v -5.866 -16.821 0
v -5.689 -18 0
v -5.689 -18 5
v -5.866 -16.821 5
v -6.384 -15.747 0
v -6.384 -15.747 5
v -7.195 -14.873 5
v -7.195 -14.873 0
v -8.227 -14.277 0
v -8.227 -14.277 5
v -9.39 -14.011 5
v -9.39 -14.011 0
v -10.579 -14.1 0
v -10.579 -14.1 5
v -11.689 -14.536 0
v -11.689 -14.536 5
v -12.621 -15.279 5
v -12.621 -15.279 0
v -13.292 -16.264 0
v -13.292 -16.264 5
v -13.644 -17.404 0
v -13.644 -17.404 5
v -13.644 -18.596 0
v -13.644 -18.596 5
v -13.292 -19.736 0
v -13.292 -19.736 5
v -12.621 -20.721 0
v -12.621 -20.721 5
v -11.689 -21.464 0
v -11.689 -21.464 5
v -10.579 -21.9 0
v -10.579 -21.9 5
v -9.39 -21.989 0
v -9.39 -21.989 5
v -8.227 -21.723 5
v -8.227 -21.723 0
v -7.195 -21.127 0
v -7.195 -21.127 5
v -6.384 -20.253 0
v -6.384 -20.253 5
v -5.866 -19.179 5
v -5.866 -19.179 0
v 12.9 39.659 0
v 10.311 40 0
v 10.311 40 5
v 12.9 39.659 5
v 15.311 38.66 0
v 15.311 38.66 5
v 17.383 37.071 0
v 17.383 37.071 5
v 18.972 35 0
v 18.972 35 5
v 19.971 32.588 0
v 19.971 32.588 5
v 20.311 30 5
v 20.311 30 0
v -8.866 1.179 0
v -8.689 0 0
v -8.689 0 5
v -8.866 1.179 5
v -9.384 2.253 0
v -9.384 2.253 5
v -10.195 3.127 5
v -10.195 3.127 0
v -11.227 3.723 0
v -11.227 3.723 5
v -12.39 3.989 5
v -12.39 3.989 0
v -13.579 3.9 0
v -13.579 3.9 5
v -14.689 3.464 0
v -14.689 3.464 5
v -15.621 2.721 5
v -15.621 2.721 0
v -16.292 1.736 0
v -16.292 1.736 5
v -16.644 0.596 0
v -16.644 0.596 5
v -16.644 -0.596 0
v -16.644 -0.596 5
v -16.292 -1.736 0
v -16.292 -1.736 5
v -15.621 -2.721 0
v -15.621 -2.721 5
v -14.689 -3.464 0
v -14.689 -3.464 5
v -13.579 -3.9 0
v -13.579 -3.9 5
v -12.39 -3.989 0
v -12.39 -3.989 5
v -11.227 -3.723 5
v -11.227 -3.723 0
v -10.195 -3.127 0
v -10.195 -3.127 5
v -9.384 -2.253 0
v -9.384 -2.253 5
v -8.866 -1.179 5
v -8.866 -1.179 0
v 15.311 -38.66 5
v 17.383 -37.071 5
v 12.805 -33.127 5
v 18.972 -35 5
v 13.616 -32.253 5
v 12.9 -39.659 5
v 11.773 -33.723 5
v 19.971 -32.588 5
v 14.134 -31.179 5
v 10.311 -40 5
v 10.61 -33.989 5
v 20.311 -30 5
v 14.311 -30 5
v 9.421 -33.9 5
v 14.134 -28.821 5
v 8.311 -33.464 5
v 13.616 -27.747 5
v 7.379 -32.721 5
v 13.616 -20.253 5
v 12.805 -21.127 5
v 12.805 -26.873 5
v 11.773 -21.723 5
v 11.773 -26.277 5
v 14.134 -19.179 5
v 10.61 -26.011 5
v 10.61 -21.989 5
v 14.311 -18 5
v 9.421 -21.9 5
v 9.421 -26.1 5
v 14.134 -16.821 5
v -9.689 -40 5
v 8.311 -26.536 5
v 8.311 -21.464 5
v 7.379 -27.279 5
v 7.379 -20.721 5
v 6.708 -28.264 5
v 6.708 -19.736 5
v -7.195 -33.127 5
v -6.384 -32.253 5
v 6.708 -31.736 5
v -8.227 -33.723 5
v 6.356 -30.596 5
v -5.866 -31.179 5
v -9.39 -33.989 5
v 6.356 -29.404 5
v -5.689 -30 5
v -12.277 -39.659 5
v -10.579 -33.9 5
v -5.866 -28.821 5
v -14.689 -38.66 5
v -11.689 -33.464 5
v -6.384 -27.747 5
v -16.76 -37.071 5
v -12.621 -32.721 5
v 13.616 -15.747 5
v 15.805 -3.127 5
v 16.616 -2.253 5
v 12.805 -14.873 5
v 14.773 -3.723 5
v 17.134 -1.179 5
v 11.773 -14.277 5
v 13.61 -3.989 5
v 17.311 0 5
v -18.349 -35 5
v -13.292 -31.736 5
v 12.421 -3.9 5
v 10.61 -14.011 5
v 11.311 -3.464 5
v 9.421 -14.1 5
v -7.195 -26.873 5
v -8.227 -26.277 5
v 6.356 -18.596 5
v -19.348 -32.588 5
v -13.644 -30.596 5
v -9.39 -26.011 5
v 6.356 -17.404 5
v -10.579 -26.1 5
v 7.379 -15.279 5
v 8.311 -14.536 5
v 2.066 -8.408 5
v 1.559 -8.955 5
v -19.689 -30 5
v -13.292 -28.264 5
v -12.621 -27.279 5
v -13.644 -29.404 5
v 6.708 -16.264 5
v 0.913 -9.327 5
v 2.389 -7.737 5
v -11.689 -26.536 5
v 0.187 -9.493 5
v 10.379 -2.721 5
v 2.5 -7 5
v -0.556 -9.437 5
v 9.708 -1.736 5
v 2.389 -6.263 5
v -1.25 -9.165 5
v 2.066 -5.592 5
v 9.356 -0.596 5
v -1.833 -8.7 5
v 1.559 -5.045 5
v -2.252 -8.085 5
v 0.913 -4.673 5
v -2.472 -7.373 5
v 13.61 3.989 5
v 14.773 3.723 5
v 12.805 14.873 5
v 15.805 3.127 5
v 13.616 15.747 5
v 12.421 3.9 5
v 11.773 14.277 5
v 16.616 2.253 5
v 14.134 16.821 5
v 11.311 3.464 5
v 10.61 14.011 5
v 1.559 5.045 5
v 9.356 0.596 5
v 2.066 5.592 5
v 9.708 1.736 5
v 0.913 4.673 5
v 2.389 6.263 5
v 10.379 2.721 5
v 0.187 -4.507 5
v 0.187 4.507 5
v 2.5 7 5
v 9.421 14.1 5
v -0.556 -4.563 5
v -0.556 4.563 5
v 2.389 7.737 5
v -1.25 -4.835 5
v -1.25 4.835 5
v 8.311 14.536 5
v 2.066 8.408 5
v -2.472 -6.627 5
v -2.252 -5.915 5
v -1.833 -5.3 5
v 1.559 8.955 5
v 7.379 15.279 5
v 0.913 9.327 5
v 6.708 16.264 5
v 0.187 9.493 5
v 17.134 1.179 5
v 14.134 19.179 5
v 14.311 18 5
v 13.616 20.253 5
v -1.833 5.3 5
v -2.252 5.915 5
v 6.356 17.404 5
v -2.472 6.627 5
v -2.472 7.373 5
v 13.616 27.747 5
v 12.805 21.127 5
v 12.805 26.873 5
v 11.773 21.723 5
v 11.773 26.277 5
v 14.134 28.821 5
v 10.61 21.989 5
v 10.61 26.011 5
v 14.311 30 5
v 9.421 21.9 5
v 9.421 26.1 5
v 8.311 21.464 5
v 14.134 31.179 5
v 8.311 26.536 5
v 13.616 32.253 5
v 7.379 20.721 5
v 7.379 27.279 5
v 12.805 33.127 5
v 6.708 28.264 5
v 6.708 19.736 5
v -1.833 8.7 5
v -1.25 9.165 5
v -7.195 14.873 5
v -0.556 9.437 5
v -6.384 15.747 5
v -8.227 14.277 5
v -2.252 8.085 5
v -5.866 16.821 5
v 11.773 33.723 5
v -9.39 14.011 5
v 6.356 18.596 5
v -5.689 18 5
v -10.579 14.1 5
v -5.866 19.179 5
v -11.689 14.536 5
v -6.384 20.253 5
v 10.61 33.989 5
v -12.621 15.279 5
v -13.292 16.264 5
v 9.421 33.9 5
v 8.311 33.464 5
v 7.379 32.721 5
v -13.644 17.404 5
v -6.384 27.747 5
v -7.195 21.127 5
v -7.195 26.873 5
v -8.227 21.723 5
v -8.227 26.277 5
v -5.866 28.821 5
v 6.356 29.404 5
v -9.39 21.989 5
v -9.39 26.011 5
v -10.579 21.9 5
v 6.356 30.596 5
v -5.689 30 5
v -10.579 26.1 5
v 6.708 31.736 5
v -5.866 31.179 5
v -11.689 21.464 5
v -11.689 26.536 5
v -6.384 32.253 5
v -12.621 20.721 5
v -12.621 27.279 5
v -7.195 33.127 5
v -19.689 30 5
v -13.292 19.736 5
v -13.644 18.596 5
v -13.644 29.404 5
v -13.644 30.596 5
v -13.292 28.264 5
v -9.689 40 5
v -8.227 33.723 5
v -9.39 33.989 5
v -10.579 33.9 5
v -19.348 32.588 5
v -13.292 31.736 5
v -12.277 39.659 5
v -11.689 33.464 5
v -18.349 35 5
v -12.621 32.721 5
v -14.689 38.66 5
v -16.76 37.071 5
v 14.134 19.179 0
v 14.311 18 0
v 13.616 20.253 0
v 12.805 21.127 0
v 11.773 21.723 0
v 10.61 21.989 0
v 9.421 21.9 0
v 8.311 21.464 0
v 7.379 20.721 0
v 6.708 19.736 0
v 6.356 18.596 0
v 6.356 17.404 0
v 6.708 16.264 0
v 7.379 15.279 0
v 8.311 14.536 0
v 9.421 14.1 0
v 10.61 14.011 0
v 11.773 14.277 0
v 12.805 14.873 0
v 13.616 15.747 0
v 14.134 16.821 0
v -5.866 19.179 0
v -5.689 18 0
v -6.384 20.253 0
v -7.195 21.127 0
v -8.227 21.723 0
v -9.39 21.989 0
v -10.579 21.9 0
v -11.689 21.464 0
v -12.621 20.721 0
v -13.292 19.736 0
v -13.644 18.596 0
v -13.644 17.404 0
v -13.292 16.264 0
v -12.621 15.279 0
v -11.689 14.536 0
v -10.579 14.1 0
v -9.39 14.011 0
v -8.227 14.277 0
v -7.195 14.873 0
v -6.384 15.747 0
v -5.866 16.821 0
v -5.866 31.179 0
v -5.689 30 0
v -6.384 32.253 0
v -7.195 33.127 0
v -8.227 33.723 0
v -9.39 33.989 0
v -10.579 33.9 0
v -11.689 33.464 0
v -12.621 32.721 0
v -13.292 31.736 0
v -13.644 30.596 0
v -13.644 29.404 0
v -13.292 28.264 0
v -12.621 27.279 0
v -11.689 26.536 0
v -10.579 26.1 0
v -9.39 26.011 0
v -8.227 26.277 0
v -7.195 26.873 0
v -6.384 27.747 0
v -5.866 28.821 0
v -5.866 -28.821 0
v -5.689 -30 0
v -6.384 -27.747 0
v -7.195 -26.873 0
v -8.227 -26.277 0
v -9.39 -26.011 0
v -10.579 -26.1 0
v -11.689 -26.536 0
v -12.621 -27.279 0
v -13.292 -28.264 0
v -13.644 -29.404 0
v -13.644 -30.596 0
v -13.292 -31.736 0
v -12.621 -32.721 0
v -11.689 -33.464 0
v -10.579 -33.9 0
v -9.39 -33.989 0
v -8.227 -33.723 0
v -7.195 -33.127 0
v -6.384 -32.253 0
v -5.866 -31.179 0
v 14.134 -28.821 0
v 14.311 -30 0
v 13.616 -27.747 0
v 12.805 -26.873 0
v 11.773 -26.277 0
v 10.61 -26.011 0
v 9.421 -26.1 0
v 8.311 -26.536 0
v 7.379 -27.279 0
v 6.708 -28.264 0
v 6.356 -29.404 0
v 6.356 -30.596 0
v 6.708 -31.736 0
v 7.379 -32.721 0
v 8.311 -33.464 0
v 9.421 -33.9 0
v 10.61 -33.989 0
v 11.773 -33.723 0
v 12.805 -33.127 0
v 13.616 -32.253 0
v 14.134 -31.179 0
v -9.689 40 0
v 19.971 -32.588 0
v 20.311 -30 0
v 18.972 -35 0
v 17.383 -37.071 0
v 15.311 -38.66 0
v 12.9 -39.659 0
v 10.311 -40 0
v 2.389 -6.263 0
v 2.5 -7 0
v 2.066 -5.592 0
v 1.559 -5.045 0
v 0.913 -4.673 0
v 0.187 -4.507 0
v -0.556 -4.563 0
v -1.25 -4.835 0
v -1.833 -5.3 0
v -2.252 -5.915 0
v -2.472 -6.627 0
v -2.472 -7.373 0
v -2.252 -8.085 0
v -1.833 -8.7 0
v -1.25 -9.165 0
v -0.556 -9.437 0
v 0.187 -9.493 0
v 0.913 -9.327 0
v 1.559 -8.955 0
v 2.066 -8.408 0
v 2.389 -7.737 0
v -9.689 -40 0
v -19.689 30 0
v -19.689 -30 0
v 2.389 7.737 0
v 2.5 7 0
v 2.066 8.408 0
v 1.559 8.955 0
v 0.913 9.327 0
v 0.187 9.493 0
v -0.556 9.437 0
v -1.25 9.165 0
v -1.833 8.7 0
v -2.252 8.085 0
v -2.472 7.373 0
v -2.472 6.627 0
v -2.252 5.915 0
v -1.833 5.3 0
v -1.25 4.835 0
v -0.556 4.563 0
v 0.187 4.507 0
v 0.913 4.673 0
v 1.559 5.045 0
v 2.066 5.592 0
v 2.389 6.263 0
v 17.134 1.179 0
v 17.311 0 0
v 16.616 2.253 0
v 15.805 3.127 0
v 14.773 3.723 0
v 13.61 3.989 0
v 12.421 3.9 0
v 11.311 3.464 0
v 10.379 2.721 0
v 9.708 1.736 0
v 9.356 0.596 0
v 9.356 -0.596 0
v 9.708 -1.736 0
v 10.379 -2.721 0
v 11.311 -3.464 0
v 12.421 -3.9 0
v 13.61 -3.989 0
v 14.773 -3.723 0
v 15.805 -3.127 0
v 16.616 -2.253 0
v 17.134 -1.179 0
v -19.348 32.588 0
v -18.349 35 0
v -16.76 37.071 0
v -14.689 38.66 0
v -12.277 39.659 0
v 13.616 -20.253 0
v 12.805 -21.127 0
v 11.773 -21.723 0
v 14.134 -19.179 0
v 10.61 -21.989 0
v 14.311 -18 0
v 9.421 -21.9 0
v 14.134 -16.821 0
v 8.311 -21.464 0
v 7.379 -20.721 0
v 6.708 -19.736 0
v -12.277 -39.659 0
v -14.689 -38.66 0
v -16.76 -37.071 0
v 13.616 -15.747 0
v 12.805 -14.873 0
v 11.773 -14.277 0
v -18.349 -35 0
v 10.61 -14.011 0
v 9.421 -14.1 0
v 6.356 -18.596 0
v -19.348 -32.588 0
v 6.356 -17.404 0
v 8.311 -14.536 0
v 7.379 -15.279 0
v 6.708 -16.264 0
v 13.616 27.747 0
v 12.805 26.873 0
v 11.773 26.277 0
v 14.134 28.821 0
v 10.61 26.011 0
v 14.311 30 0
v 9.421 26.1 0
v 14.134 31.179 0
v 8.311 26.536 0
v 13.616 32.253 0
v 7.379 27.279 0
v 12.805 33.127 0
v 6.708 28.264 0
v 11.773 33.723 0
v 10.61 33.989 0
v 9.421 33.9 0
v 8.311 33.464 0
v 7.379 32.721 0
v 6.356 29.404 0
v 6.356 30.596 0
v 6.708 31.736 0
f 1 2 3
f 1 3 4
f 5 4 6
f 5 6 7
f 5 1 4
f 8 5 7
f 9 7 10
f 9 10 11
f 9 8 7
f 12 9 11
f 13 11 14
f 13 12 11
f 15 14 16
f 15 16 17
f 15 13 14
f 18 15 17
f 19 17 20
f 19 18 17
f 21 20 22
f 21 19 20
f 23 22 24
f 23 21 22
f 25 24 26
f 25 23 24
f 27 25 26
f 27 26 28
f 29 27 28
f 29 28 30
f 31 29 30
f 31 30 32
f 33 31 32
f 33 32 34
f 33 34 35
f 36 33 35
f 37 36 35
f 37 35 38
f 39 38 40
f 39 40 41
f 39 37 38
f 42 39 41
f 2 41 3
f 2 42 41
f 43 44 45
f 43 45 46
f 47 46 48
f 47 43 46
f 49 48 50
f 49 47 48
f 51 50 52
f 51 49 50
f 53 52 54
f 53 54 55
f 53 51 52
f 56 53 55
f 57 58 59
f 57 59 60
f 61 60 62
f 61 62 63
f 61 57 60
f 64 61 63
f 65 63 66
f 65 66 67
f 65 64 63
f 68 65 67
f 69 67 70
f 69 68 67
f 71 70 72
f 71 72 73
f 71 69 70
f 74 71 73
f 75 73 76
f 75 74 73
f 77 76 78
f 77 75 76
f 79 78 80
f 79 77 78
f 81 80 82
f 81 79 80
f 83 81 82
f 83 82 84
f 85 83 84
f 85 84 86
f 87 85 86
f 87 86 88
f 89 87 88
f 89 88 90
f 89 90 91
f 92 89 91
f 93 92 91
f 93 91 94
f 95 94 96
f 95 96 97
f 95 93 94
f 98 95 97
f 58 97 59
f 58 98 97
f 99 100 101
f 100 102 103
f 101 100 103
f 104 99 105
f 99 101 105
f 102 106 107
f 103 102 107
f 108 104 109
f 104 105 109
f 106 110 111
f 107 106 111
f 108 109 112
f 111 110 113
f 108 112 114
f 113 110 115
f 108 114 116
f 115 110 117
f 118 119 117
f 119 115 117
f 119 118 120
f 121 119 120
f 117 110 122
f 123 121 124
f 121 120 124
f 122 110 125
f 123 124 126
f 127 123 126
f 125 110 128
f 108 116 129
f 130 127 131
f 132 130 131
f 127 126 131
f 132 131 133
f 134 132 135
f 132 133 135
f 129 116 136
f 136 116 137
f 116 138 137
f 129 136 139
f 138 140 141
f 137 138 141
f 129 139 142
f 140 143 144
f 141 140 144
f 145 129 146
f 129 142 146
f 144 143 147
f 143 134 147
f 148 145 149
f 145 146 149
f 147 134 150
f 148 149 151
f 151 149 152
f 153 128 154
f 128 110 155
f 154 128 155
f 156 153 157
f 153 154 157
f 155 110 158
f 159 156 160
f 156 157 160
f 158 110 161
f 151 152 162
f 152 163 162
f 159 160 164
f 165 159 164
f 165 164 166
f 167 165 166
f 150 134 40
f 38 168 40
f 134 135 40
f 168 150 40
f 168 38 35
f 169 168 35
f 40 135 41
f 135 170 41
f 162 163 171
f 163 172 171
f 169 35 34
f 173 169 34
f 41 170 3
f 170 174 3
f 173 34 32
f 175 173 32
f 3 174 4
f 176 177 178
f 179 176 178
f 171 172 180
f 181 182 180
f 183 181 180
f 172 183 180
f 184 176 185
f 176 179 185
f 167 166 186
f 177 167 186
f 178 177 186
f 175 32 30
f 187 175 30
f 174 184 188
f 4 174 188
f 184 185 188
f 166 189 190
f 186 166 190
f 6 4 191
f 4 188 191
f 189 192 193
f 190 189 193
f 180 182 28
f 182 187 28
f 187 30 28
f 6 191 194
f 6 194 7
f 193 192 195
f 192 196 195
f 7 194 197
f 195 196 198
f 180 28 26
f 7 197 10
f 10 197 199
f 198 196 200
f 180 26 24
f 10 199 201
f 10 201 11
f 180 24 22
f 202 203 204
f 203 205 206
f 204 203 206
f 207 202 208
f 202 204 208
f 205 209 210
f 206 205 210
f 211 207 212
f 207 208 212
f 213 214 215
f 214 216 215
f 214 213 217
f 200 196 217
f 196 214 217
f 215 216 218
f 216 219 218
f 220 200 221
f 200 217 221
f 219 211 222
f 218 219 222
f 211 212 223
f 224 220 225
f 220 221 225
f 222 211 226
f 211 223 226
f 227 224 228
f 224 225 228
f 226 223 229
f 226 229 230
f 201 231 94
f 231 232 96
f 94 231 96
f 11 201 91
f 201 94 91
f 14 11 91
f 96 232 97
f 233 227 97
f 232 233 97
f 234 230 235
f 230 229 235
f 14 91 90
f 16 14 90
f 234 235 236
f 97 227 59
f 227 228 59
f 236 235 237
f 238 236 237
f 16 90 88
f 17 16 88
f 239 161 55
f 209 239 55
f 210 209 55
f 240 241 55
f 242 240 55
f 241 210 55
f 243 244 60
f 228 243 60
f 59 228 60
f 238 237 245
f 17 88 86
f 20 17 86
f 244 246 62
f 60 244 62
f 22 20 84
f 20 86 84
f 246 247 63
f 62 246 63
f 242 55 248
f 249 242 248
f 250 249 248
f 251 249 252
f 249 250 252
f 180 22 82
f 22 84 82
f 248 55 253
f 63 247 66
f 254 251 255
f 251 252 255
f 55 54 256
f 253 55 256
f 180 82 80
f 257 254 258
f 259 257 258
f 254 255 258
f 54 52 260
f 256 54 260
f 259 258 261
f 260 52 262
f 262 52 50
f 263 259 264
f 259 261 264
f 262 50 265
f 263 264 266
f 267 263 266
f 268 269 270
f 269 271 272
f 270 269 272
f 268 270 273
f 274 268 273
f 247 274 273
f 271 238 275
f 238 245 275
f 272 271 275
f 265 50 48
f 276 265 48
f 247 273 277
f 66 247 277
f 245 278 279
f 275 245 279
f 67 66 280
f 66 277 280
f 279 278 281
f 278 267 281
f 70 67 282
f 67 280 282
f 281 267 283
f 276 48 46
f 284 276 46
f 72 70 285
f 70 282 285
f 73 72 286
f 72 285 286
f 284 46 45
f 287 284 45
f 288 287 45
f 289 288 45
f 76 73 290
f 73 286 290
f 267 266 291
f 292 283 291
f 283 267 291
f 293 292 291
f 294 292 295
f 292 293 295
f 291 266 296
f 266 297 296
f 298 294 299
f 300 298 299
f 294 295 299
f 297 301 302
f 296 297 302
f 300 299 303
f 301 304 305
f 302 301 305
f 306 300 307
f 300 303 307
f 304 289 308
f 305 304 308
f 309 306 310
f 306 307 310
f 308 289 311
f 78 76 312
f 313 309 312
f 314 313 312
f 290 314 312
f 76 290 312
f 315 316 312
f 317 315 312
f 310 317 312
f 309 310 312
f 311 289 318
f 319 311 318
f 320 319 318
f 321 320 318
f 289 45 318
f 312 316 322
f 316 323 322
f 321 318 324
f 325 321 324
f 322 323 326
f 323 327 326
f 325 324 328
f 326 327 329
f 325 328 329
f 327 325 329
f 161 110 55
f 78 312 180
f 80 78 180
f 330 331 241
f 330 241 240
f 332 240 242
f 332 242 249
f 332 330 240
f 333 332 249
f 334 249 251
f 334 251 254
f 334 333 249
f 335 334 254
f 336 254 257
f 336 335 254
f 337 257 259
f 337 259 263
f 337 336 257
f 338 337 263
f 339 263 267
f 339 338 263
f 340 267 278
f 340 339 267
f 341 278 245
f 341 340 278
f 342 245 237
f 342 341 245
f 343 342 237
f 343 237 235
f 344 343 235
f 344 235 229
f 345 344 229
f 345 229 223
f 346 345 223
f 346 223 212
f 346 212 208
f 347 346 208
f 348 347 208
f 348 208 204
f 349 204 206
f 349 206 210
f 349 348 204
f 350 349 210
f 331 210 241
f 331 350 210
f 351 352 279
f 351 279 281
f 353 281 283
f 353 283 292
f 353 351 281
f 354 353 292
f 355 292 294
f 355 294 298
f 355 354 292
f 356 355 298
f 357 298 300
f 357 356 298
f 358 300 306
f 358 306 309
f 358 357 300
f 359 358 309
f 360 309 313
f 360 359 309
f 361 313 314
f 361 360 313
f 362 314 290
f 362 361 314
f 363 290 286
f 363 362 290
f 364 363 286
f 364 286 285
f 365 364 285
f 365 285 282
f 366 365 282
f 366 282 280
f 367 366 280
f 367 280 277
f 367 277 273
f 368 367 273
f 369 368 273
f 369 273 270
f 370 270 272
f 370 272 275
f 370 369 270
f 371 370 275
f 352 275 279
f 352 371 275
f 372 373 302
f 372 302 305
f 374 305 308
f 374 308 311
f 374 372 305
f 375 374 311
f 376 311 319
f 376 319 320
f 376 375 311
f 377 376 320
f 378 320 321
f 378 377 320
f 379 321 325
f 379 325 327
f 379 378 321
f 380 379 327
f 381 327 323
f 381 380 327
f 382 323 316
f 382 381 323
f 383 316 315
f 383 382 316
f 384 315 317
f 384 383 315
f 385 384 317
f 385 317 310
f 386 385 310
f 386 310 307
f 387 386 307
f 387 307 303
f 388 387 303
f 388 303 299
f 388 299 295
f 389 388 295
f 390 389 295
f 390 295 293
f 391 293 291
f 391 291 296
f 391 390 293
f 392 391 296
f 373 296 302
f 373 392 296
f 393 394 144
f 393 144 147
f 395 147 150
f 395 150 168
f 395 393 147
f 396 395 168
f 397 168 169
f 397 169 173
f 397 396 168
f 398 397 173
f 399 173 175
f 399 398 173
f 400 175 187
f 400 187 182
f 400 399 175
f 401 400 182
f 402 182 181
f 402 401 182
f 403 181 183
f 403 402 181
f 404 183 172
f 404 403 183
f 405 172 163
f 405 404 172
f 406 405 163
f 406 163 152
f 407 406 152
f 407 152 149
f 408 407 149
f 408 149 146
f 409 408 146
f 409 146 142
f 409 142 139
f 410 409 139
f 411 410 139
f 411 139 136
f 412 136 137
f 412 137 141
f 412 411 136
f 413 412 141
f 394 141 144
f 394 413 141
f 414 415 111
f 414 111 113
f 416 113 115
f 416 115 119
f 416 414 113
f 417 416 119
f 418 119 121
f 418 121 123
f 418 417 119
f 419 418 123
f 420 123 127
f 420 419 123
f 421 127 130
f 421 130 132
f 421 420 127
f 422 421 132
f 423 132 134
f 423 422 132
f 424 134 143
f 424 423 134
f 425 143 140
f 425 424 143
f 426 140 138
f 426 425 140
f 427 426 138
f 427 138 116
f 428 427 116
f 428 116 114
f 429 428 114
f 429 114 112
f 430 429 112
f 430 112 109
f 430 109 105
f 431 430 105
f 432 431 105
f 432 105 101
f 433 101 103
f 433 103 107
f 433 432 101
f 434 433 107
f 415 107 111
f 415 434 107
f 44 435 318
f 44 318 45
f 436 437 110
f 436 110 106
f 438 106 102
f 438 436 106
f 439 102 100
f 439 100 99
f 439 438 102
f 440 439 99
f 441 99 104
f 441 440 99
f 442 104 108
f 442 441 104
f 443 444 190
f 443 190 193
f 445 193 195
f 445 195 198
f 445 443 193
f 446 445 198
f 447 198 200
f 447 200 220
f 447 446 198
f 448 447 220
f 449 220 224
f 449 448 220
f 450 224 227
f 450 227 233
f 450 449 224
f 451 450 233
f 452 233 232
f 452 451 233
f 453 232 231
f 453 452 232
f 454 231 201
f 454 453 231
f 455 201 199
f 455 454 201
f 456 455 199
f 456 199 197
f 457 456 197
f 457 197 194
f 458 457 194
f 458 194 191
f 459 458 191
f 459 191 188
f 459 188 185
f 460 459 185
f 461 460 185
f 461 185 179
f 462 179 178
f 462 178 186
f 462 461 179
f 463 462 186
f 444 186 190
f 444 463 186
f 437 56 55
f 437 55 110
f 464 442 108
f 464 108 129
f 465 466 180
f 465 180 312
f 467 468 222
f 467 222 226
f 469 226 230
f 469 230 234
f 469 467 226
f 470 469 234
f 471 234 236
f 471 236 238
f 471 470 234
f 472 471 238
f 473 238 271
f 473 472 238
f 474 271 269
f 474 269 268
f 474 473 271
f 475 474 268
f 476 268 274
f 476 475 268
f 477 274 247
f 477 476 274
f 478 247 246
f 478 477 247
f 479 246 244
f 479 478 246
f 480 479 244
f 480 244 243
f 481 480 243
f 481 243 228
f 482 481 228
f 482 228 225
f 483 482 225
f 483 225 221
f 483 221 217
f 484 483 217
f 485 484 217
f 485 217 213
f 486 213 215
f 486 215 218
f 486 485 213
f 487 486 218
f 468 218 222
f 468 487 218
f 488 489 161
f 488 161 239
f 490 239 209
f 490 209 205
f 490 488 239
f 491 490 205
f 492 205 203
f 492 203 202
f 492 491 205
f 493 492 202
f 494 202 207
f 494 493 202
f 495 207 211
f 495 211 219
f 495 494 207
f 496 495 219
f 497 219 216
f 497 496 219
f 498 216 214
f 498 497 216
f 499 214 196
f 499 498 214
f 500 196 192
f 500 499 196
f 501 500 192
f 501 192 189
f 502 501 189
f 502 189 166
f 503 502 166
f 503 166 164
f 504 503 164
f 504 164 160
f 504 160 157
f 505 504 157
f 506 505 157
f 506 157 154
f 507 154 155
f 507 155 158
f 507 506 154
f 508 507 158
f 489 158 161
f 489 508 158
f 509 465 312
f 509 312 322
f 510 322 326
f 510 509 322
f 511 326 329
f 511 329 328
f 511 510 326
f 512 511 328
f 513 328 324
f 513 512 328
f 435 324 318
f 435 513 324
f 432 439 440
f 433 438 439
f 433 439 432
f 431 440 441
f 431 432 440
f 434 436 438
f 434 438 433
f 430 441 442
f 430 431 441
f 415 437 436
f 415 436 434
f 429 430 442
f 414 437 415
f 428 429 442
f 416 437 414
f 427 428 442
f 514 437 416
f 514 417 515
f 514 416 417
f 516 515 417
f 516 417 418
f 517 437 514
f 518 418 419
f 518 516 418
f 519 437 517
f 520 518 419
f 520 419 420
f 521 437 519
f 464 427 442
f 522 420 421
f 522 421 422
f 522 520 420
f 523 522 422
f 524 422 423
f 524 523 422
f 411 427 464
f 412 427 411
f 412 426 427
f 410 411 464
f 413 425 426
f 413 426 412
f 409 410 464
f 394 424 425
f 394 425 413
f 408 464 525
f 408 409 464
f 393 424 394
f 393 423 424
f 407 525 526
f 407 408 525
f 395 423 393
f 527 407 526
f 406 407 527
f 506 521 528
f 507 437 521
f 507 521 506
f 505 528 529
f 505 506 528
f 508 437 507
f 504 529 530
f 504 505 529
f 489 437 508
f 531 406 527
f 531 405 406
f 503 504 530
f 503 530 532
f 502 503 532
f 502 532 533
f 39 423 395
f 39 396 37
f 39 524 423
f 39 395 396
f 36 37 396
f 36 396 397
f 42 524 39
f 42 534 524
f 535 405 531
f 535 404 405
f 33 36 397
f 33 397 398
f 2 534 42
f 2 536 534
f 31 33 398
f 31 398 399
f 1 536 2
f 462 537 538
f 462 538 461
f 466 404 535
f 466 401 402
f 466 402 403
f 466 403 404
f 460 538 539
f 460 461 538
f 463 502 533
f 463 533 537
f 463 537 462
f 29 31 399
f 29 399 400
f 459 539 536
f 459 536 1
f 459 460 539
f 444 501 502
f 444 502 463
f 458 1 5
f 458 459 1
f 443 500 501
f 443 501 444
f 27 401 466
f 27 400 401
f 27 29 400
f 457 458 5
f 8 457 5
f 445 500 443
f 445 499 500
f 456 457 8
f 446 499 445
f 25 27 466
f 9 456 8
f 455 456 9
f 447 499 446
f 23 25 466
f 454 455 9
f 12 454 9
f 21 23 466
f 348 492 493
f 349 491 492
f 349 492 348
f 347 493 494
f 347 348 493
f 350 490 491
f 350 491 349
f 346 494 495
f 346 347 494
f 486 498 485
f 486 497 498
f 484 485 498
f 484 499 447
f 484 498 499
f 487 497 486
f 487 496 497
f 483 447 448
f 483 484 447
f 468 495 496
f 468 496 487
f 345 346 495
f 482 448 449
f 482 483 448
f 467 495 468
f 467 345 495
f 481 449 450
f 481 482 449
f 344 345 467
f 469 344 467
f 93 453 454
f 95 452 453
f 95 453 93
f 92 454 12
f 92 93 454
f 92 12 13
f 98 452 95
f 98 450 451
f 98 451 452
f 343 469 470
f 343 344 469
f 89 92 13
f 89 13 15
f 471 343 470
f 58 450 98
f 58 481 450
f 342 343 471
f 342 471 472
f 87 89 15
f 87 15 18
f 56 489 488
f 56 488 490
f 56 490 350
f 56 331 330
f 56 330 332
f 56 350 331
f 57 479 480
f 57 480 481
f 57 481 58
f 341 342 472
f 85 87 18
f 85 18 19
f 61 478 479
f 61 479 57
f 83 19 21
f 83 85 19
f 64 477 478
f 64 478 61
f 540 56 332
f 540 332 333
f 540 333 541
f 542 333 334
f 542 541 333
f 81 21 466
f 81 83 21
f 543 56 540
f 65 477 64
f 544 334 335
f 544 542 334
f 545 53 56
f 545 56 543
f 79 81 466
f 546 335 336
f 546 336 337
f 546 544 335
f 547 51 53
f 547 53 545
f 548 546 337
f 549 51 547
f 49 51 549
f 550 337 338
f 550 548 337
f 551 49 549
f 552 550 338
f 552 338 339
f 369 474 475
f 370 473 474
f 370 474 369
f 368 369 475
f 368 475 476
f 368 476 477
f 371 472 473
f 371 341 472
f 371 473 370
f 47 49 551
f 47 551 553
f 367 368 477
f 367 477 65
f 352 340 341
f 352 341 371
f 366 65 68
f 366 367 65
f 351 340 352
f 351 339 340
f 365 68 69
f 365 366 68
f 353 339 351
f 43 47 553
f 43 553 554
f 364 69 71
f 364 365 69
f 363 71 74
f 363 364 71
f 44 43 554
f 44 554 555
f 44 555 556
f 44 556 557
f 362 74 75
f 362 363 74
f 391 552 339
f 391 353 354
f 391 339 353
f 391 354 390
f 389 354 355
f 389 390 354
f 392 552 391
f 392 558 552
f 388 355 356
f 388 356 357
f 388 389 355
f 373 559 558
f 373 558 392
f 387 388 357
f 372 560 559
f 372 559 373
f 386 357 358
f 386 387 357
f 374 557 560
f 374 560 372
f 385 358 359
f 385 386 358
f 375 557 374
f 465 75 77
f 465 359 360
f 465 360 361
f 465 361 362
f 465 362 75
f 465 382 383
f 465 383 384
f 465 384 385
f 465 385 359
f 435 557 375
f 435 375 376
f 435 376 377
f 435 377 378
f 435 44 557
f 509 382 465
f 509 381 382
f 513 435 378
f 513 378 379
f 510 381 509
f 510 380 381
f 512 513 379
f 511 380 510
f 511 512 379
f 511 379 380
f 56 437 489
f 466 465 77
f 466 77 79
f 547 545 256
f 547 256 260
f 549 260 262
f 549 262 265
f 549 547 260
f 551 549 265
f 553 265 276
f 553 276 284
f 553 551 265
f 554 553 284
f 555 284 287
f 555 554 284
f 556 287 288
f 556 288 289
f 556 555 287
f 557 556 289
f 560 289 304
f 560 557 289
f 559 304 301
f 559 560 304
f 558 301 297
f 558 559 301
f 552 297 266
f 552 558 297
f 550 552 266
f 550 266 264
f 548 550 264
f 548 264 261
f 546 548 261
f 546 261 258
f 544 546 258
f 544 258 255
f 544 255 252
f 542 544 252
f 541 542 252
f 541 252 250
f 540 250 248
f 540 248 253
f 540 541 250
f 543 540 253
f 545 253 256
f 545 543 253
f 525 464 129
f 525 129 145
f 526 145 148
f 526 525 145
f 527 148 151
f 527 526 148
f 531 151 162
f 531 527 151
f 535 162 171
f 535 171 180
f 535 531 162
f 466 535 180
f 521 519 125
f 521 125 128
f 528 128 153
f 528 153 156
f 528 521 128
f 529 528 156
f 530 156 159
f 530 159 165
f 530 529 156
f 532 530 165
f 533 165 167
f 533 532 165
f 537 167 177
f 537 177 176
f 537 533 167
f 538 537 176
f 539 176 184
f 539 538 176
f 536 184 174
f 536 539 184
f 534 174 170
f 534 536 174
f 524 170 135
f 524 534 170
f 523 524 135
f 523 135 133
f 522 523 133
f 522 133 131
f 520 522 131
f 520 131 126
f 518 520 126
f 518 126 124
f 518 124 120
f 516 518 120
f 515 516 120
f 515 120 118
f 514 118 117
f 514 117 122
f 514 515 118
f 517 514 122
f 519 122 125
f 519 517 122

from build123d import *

# Parameters (mm, degrees)
SKETCH1_R           = 2.5
SKETCH1_R_2         = 4
BOSS_EXTRUDE1_DEPTH = 5


with BuildPart() as part:
    # Sketch1 → Boss-Extrude1 (new body)
    with BuildSketch(Plane.XY):
        with BuildLine():
            Line((-9.688536745, 40), (10.311463255, 40))
            ThreePointArc((10.311463255, 40), (17.382531067, 37.071067812), (20.311463255, 30))
            Line((20.311463255, 30), (20.311463255, -30))
            ThreePointArc((20.311463255, -30), (17.382531067, -37.071067812), (10.311463255, -40))
            Line((10.311463255, -40), (-9.688536745, -40))
            ThreePointArc((-9.688536745, -40), (-16.759604557, -37.071067812), (-19.688536745, -30))
            Line((-19.688536745, -30), (-19.688536745, 30))
            ThreePointArc((-19.688536745, 30), (-16.759604557, 37.071067812), (-9.688536745, 40))
        make_face()
        with Locations((0, 7)):
            Circle(SKETCH1_R, mode=Mode.SUBTRACT)
        with Locations((0, -7)):
            Circle(SKETCH1_R, mode=Mode.SUBTRACT)
        with Locations((-9.688536745, 30)):
            Circle(SKETCH1_R_2, mode=Mode.SUBTRACT)
        with Locations((10.311463255, 30)):
            Circle(SKETCH1_R_2, mode=Mode.SUBTRACT)
        with Locations((-9.688536745, -30)):
            Circle(SKETCH1_R_2, mode=Mode.SUBTRACT)
        with Locations((10.311463255, -30)):
            Circle(SKETCH1_R_2, mode=Mode.SUBTRACT)
        with Locations((-12.688536745, 0)):
            Circle(SKETCH1_R_2, mode=Mode.SUBTRACT)
        with Locations((13.311463255, 0)):
            Circle(SKETCH1_R_2, mode=Mode.SUBTRACT)
        with Locations((-9.688536745, -18)):
            Circle(SKETCH1_R_2, mode=Mode.SUBTRACT)
        with Locations((10.311463255, -18)):
            Circle(SKETCH1_R_2, mode=Mode.SUBTRACT)
        with Locations((10.311463255, 18)):
            Circle(SKETCH1_R_2, mode=Mode.SUBTRACT)
        with Locations((-9.688536745, 18)):
            Circle(SKETCH1_R_2, mode=Mode.SUBTRACT)
    extrude(amount=BOSS_EXTRUDE1_DEPTH)


solid = part.part
